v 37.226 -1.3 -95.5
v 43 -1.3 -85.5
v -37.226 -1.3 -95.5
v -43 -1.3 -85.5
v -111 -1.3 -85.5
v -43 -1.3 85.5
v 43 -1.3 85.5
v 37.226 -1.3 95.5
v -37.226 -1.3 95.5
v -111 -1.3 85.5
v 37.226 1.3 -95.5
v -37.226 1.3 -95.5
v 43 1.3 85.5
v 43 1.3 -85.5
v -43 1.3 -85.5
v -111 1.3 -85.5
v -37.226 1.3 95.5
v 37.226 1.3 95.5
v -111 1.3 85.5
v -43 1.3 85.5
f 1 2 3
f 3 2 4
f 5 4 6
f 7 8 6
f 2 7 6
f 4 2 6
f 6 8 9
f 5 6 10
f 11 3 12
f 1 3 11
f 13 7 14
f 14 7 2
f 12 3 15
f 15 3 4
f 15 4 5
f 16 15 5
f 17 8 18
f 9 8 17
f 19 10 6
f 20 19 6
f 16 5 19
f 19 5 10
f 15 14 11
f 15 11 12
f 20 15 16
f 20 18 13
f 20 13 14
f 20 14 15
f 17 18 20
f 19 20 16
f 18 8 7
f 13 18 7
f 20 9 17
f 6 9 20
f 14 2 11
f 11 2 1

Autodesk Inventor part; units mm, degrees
ref_plane "YZ Plane" through (0, 0, 0) normal (1, 0, 0) x (0, 1, 0)
ref_plane "XZ Plane" through (0, 0, 0) normal (0, 1, 0) x (-1, 0, 0)
ref_plane "XY Plane" through (0, 0, 0) normal (0, 0, 1) x (1, 0, 0)
sketch "Sketch1" plane through (0, 0, 0) normal (0, 1, 0) x (-1, 0, 0)
  line L0 (-37.2265, 95.5) -> (37.2265, 95.5)
  line L1 (37.2265, -95.5) -> (-37.2265, -95.5)
  line L2 (43, -85.5) -> (111, -85.5)
  line L3 (111, -85.5) -> (111, 85.5)
  line L4 (111, 85.5) -> (43, 85.5)
  line L5 (-37.2265, 95.5) -> (-43, 85.5)
  line L6 (-43, 85.5) -> (-43, -85.5)
  line L7 (-43, -85.5) -> (-37.2265, -95.5)
  line L8 (37.2265, -95.5) -> (43, -85.5)
  line L9 (37.2265, 95.5) -> (43, 85.5)
  point P0 (0, 0)
  point P1 (0, 0)
  point P2 (111, 0)
  dimension "d5" = 191
  dimension "d6" = 171
  dimension "d8" = 154
  dimension "d10" = 120
  dimension "d11" = 86
extrude "Extrusion1" add sketch "Sketch1" along normal mid plane 2.6
properties part number "PlayerLeaderslMats_All" material "Paper"
